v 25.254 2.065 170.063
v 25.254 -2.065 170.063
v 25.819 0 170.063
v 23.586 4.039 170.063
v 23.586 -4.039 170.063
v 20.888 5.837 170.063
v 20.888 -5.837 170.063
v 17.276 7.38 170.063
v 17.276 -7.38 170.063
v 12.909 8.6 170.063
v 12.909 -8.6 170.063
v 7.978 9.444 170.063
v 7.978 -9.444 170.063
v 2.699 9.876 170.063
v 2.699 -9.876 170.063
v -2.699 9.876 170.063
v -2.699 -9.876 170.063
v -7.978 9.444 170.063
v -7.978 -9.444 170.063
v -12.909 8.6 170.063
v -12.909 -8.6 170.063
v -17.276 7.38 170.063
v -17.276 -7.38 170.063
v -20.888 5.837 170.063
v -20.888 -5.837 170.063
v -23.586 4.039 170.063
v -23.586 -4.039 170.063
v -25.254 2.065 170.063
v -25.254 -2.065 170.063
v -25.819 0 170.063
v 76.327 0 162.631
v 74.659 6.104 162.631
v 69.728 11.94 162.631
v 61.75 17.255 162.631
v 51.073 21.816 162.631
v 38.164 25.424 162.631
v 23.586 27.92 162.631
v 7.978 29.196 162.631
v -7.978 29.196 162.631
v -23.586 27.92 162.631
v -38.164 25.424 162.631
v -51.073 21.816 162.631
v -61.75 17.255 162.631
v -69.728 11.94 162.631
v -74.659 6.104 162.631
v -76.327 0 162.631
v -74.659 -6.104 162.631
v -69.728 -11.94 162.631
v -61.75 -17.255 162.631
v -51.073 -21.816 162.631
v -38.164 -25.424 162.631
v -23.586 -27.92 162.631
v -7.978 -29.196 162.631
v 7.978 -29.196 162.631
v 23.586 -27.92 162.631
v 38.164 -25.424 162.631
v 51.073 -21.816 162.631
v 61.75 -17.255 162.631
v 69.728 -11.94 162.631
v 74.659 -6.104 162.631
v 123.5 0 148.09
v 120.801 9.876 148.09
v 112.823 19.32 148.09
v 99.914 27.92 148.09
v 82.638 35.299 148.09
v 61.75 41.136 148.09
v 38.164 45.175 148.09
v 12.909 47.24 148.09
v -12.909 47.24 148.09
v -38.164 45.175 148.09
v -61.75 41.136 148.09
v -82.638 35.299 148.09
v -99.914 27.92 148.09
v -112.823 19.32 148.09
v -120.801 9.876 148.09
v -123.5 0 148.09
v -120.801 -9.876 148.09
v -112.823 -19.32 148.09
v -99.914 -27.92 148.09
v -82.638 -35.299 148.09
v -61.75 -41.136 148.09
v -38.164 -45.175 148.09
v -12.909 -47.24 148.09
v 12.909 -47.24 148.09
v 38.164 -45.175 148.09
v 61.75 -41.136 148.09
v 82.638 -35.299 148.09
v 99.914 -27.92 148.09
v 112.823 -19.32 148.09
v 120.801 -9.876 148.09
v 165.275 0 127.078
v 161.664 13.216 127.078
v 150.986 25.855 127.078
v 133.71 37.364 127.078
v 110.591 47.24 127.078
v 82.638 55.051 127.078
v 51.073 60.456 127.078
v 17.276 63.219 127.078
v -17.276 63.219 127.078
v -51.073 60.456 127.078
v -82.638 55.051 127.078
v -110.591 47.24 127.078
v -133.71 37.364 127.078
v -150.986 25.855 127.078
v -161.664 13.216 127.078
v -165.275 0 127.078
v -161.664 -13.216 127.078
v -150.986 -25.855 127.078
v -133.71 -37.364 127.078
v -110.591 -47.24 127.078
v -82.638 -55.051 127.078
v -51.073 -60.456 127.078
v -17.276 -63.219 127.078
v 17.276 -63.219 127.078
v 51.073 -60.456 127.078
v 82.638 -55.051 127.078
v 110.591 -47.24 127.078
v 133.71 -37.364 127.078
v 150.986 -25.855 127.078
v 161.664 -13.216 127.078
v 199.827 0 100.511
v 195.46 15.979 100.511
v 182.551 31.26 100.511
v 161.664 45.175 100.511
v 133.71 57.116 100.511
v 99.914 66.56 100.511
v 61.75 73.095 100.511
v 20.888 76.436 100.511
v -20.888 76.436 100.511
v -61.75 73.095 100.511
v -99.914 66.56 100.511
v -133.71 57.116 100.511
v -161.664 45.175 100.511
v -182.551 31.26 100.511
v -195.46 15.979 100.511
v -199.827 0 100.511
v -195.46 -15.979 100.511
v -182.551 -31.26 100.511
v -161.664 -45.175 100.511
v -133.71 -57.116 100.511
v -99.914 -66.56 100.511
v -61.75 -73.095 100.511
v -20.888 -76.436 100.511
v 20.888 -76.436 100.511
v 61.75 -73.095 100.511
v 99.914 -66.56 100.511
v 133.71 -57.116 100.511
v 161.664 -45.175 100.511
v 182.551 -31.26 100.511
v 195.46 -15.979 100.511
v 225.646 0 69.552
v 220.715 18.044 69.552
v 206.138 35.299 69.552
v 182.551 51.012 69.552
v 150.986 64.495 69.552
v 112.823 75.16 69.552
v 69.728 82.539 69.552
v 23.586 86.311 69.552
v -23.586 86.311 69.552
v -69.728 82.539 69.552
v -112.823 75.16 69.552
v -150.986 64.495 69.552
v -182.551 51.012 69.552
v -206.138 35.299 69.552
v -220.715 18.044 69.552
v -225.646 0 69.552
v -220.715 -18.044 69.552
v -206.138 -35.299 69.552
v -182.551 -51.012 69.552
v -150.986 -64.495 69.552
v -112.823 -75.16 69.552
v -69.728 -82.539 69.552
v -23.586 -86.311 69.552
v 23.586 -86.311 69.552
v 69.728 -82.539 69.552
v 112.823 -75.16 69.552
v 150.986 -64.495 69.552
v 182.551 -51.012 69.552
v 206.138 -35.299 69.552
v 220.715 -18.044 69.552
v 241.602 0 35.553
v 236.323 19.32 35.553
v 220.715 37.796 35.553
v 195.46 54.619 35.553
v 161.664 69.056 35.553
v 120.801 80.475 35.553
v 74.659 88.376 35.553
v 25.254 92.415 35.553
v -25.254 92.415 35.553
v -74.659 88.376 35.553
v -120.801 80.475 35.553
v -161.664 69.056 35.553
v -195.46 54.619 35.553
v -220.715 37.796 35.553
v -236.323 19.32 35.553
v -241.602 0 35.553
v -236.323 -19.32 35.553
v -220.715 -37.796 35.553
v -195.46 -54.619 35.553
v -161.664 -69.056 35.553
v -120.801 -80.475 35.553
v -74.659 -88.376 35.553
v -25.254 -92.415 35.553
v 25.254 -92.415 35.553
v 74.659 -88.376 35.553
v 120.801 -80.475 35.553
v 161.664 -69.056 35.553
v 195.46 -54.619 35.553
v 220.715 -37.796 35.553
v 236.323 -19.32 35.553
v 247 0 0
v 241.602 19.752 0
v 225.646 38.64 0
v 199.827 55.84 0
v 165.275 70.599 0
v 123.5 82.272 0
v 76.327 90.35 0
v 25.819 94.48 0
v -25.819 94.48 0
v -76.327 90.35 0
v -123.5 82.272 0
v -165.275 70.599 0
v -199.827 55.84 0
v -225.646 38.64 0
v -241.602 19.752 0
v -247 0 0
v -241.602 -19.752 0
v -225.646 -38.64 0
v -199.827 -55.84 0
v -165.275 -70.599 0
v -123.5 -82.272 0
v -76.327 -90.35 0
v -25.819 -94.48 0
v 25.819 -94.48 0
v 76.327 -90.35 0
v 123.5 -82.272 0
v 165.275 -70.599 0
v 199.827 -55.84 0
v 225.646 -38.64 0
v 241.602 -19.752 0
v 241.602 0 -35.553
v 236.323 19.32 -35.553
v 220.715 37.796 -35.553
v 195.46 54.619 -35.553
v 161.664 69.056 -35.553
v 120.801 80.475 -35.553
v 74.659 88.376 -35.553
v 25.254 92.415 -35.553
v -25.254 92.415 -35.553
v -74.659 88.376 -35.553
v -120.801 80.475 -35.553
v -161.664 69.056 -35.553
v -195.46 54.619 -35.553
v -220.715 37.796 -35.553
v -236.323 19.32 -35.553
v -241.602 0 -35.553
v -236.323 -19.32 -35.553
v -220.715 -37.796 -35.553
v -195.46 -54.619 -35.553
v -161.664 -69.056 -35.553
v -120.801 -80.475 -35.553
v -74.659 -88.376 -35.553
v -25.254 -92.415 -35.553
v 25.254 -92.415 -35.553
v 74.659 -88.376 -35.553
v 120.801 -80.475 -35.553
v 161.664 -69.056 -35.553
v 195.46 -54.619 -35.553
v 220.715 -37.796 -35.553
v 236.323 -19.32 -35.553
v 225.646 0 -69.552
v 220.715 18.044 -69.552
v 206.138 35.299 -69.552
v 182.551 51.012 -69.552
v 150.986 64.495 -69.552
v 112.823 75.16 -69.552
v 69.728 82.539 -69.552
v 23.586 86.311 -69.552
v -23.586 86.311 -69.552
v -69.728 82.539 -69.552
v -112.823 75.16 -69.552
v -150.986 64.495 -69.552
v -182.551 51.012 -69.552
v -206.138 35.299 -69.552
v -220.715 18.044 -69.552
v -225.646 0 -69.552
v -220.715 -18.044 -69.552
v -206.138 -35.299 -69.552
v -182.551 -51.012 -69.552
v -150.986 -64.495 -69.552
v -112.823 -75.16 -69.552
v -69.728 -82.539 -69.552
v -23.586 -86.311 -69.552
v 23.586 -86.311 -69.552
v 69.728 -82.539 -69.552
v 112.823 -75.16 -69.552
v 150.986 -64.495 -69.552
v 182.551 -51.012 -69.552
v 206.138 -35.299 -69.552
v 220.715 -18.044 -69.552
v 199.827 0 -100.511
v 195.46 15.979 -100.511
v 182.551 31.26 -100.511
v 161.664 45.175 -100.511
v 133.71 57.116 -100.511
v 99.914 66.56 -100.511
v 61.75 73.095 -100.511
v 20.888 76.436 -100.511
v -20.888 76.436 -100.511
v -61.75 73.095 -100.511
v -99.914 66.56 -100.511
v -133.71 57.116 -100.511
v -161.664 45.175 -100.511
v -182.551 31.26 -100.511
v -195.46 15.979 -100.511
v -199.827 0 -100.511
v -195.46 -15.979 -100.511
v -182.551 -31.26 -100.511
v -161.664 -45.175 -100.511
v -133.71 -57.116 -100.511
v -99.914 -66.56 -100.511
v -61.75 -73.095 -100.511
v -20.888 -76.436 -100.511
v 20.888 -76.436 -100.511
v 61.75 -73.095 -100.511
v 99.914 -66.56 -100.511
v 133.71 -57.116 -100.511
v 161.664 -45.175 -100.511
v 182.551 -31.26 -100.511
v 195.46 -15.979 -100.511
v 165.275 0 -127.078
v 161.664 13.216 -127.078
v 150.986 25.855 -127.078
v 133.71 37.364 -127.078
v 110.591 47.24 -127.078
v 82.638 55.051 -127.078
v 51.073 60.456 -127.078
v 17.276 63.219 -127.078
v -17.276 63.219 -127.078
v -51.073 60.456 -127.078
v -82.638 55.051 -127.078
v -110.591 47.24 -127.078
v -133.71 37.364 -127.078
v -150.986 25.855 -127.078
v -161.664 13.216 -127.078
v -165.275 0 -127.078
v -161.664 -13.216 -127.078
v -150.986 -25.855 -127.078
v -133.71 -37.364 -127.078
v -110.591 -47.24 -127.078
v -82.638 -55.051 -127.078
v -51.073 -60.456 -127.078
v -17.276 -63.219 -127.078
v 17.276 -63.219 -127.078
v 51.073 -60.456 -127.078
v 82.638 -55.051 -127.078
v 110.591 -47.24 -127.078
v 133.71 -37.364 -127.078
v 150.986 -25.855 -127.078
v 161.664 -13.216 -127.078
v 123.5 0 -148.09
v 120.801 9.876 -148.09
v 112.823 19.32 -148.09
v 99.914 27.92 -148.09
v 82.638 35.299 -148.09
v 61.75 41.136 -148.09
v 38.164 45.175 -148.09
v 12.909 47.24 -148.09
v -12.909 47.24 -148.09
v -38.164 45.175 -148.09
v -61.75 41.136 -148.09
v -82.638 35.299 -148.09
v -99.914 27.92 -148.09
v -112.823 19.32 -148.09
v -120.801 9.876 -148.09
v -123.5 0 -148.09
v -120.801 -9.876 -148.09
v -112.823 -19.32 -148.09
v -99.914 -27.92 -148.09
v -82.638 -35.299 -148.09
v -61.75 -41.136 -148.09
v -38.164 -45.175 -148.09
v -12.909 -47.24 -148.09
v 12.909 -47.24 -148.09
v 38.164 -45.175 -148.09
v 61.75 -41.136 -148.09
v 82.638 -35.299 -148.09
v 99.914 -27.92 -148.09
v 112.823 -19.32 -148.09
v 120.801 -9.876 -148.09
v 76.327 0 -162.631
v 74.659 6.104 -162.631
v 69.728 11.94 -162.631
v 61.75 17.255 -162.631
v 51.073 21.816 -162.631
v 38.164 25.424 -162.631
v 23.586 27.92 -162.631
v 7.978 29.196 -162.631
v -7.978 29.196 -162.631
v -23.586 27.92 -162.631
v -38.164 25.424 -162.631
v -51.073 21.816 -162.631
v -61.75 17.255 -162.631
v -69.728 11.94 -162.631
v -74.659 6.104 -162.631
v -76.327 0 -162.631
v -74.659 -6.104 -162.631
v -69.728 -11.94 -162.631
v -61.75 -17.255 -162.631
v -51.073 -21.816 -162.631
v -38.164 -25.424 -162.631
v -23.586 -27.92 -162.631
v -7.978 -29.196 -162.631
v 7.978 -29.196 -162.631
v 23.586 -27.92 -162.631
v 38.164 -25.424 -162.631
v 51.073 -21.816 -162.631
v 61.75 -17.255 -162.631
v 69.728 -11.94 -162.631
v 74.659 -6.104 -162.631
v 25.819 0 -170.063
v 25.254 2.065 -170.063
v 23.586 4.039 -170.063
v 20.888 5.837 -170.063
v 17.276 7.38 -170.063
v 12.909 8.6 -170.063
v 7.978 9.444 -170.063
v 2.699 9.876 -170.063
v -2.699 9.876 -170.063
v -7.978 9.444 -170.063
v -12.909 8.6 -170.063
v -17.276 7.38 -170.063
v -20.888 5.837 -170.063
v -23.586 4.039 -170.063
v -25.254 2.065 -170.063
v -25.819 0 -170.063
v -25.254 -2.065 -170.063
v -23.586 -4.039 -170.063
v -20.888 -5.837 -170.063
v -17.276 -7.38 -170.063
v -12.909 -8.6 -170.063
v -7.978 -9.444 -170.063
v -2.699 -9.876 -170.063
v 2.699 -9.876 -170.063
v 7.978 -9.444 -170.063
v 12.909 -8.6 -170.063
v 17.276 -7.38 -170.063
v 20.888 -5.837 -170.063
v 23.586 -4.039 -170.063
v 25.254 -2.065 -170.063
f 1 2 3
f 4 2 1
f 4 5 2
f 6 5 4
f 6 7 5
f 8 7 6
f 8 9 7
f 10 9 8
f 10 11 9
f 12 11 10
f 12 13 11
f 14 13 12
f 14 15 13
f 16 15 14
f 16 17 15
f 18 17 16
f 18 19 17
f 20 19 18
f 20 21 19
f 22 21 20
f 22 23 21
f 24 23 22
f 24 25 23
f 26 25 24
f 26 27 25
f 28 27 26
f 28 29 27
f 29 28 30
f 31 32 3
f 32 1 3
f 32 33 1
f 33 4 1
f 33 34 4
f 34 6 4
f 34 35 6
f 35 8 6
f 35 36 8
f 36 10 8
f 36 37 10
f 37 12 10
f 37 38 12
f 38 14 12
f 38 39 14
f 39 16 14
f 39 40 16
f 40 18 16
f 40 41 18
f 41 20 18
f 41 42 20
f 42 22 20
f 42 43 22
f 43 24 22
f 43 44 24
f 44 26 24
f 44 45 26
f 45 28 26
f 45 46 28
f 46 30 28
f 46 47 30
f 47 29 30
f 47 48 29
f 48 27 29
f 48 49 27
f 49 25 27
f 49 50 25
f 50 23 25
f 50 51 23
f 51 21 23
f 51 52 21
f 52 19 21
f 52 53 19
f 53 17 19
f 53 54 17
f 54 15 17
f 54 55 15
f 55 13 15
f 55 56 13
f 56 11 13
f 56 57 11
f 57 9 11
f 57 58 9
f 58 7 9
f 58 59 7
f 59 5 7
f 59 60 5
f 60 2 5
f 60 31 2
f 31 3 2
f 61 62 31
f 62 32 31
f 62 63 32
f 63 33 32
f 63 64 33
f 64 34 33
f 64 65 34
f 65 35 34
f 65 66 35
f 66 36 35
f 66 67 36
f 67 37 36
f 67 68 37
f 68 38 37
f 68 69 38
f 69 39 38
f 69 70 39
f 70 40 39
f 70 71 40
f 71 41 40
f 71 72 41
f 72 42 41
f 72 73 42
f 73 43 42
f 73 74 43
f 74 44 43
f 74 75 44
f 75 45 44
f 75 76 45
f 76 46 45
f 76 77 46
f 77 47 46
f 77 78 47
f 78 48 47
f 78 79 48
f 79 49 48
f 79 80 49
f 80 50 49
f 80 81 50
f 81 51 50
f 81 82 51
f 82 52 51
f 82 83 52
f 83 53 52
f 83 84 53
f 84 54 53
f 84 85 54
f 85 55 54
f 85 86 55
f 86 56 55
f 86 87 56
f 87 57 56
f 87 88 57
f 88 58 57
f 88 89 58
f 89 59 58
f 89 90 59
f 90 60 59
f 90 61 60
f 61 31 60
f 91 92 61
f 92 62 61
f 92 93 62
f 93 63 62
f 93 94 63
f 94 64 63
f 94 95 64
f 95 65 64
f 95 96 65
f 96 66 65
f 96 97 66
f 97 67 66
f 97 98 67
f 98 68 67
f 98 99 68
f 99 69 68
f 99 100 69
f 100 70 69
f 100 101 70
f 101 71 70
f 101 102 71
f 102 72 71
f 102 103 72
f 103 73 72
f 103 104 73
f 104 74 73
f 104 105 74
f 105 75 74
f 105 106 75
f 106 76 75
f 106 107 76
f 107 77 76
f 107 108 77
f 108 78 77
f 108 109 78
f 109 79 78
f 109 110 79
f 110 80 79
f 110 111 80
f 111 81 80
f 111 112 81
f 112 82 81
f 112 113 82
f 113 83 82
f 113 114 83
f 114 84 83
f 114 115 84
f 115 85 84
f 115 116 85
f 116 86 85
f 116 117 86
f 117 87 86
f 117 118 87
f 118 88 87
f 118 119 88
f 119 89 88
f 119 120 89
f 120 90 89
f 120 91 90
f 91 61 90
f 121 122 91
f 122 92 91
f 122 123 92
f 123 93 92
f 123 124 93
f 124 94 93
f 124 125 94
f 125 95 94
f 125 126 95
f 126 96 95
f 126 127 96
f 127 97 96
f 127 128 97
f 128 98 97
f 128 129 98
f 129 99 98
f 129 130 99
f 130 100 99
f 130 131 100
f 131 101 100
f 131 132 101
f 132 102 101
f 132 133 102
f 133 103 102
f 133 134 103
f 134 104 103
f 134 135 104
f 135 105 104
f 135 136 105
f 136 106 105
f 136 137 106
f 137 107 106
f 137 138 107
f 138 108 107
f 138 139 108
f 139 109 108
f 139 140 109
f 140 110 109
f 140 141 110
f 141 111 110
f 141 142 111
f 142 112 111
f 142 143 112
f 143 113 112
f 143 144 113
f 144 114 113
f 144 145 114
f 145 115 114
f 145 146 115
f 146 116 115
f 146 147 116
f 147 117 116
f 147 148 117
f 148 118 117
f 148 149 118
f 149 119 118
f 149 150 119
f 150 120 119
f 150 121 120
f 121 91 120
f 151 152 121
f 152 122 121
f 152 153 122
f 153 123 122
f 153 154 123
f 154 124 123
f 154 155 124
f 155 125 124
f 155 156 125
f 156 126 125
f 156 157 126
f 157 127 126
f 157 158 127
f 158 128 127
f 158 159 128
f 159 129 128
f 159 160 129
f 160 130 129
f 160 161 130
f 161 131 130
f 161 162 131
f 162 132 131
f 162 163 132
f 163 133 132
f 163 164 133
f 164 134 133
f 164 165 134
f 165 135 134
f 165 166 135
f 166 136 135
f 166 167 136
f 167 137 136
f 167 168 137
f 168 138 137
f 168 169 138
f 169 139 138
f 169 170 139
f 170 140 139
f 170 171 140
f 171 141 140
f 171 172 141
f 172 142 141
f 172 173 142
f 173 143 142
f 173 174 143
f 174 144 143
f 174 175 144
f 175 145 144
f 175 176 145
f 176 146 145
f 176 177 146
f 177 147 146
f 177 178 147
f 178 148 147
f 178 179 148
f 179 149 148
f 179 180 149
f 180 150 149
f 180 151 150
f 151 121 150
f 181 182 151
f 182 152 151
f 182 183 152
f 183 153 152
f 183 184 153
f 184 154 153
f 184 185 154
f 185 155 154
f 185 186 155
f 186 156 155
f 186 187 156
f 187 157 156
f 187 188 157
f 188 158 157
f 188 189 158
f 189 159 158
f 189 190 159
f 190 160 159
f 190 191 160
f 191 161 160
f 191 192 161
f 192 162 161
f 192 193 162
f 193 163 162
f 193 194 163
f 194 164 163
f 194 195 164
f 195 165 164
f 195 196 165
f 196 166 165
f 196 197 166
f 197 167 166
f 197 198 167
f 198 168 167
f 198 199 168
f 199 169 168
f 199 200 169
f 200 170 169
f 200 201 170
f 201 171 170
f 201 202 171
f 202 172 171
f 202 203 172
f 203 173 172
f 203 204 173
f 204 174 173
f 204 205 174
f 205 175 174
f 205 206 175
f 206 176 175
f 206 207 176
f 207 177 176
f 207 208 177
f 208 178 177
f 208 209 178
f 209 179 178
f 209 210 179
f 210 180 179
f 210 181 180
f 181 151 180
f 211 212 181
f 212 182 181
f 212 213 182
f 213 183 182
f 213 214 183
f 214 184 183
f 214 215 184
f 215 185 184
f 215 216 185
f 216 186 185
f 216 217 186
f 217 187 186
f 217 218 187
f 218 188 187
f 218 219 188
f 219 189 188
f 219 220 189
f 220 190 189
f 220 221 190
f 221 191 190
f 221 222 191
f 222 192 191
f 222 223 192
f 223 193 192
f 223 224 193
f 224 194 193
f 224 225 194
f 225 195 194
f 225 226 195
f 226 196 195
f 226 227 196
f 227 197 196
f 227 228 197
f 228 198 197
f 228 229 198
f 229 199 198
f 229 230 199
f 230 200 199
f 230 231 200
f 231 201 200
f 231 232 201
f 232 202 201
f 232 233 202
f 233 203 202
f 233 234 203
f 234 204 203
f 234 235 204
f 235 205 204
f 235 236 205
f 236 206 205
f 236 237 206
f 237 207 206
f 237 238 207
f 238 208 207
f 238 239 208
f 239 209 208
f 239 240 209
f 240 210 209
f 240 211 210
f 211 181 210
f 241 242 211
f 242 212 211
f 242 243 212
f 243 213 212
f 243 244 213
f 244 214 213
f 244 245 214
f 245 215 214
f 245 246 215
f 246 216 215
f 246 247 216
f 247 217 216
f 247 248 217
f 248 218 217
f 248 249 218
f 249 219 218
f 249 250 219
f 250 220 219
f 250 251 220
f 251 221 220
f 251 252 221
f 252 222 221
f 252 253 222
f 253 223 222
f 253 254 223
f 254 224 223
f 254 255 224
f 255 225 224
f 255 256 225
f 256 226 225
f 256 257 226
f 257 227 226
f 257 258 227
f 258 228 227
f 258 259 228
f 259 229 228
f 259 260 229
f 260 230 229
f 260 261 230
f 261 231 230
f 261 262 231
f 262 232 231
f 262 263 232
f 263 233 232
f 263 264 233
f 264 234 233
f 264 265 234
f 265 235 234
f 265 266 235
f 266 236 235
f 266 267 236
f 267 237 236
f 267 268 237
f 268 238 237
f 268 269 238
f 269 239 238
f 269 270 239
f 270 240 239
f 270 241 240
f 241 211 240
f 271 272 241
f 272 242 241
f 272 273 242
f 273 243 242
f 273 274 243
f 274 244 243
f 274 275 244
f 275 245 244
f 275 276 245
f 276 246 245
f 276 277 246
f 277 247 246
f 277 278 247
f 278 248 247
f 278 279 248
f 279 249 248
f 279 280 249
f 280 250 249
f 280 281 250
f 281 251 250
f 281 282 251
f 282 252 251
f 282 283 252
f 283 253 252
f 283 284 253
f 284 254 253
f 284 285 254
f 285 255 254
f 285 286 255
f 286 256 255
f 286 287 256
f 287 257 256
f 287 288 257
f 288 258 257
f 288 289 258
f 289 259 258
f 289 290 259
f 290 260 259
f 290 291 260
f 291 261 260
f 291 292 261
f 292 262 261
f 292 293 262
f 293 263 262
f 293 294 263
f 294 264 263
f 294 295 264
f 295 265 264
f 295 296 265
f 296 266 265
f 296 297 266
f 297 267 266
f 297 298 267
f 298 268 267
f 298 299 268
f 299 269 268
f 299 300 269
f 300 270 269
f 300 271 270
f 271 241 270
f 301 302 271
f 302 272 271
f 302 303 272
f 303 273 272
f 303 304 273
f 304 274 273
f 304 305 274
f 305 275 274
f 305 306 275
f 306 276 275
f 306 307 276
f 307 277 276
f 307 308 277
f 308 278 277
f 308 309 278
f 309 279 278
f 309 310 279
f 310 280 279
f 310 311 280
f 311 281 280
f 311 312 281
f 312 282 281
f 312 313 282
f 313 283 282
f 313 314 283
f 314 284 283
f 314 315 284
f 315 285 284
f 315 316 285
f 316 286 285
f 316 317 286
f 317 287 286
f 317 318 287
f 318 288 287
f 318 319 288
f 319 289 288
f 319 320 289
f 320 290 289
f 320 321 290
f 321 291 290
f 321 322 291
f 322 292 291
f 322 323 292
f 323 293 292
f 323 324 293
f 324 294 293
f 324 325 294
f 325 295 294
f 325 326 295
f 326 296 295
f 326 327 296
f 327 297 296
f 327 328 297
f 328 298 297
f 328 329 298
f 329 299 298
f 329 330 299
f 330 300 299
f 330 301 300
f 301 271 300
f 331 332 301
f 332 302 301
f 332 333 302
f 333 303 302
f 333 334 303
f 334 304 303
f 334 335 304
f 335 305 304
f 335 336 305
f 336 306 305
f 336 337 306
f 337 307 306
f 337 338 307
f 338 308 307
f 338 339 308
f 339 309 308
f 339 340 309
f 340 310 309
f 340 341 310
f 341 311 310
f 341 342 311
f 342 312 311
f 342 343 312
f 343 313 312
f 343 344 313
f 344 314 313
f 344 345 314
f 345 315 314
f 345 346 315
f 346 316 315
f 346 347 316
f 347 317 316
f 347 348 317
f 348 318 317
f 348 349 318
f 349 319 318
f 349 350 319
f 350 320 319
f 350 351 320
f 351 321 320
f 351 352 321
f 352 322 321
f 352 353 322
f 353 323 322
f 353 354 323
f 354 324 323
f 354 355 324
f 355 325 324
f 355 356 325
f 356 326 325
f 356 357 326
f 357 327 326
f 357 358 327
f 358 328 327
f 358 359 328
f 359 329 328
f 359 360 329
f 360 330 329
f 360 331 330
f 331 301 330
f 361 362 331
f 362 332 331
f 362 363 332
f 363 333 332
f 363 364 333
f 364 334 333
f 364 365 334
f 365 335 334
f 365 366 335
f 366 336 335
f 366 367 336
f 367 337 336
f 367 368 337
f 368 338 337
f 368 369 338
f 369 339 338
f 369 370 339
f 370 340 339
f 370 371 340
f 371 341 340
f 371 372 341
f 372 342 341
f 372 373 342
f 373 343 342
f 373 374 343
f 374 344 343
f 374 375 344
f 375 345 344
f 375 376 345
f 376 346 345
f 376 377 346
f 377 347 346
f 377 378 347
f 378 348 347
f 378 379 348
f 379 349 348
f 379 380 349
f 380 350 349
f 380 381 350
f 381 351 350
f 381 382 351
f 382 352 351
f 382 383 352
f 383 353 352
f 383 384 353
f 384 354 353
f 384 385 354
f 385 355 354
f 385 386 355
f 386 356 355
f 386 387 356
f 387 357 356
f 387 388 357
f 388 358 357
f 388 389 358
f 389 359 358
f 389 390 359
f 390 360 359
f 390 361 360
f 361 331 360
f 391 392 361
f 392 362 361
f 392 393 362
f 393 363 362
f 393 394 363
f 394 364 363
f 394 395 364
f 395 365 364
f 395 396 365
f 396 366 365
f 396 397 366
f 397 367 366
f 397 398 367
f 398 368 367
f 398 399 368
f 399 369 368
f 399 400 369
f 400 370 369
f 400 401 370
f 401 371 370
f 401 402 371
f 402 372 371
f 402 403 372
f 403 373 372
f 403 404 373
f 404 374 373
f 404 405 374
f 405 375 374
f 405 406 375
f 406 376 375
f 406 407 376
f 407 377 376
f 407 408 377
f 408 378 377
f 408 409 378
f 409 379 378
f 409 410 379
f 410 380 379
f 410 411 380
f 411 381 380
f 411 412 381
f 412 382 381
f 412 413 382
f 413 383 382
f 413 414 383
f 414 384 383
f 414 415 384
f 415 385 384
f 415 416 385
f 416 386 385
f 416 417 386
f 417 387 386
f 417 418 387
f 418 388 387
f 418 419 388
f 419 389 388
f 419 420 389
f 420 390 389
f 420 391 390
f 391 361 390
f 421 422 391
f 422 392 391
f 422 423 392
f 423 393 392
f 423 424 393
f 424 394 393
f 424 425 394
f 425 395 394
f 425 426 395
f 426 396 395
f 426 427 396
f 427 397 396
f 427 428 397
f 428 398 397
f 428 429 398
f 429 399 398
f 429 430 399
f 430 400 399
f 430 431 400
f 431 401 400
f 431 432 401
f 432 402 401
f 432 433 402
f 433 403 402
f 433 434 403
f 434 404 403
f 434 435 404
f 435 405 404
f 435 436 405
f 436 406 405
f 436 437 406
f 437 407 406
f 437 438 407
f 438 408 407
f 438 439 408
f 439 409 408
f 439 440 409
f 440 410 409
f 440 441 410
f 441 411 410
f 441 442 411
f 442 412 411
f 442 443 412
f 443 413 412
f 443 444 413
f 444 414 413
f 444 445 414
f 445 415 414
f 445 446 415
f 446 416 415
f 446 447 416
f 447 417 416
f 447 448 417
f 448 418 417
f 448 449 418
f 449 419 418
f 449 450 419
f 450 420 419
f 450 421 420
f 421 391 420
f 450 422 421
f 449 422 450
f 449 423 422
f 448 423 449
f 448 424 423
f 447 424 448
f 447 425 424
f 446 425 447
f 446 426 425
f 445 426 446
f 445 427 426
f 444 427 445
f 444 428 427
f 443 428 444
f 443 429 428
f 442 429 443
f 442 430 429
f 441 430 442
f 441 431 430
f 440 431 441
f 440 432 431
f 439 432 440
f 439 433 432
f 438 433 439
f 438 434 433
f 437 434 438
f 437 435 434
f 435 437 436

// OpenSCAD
// Generated by SolidPython 1.0.1 on 2020-07-29 00:46:50


scale(v = [13, 5, 9]) {
	sphere(r = 19);
}
/***********************************************
*********      SolidPython code:      **********
************************************************
 
# import packages: SolidPython
from solid import *
from solid.utils import *
from itertools import chain, combinations, permutations


class Resize:

    def __init__(self, scad_file):
        self.scad_file = scad_file
        #self.scad_file = import_scad(scad_file)
        # cone/cylinder param:
        self.r1 = 0
        self.r2 = 0
        self.h = 0
        # rectangular prism param:
        self.w = 0
        self.l = 0
        # ellipse param:
        self.r = 0

    # import OpenScad code (file name corresponds to shape)


    # classify shape + parameters
    def assign(self, param1, param2, param3):
        if self.scad_file == 'cone.scad':
            self.r1 = param1
            self.r2 = param2
            self.h = param3
        elif self.scad_file == 'cylinder.scad':
            self.r1 = param1
            self.r2 = param2
            self.h = param3
        elif self.scad_file == 'rectangularPrism.scad':
            self.h = param1
            self.l = param2
            self.w = param3
        else:
            self.r = param1
            self.h = param2

    # resize parameters
    def iterate(self):
        x = range(3, 20, 2)
        i = 1
        if self.scad_file == 'cone.scad':
            tempList = list(permutations(x, 2))
            for temp in tempList:
                param1 = temp[0]
                param2 = temp[1]
                filepath = 'produced_scad_files/' + 'cone' + str(param1) + '_' + str(param2) + '_' + '.scad'
                scad_render_to_file(cylinder(h=param1, r1=param2, r2=0), filepath)

        elif self.scad_file == 'cylinder.scad':
            tempList = list(permutations(x, 3))
            for temp in tempList:
                param1 = temp[0]
                param2 = temp[1]
                filepath = 'produced_scad_files/' + 'cylinder' + str(param1) + '_' + str(param2) + '_' + '.scad'
                scad_render_to_file(cylinder(h=param1, r1=param2, r2=param2), filepath)

        elif self.scad_file == 'rectangularPrism.scad':
            tempList = list(permutations(x, 3))
            for temp in tempList:
                param1 = temp[0]
                param2 = temp[1]
                param3 = temp[2]
                filepath = 'produced_scad_files/' + 'rectangularPrism' + str(param1) + '_' + str(param2) + '_' + str(
                    param3) + '.scad'
                scad_render_to_file(cube(size=(param1, param2, param3)), filepath)

        elif self.scad_file == 'ellipse.scad':
            tempList = list(permutations(x, 4))
            for temp in tempList:
                param1 = temp[0]
                param2 = temp[1]
                param3 = temp[2]
                param4 = temp[3]
                filepath = 'produced_scad_files/' + 'ellipse' + str(param1) + '_' + str(param2) + '_' + str(param3) + '_' + str(param4) + '.scad'
                scad_render_to_file(scale([param1, param2, param3])(sphere(r=param4)), filepath)

    def render_to_scadfile(self):
        scad_render_to_file(scad, 'example.scad') 
 
************************************************/
